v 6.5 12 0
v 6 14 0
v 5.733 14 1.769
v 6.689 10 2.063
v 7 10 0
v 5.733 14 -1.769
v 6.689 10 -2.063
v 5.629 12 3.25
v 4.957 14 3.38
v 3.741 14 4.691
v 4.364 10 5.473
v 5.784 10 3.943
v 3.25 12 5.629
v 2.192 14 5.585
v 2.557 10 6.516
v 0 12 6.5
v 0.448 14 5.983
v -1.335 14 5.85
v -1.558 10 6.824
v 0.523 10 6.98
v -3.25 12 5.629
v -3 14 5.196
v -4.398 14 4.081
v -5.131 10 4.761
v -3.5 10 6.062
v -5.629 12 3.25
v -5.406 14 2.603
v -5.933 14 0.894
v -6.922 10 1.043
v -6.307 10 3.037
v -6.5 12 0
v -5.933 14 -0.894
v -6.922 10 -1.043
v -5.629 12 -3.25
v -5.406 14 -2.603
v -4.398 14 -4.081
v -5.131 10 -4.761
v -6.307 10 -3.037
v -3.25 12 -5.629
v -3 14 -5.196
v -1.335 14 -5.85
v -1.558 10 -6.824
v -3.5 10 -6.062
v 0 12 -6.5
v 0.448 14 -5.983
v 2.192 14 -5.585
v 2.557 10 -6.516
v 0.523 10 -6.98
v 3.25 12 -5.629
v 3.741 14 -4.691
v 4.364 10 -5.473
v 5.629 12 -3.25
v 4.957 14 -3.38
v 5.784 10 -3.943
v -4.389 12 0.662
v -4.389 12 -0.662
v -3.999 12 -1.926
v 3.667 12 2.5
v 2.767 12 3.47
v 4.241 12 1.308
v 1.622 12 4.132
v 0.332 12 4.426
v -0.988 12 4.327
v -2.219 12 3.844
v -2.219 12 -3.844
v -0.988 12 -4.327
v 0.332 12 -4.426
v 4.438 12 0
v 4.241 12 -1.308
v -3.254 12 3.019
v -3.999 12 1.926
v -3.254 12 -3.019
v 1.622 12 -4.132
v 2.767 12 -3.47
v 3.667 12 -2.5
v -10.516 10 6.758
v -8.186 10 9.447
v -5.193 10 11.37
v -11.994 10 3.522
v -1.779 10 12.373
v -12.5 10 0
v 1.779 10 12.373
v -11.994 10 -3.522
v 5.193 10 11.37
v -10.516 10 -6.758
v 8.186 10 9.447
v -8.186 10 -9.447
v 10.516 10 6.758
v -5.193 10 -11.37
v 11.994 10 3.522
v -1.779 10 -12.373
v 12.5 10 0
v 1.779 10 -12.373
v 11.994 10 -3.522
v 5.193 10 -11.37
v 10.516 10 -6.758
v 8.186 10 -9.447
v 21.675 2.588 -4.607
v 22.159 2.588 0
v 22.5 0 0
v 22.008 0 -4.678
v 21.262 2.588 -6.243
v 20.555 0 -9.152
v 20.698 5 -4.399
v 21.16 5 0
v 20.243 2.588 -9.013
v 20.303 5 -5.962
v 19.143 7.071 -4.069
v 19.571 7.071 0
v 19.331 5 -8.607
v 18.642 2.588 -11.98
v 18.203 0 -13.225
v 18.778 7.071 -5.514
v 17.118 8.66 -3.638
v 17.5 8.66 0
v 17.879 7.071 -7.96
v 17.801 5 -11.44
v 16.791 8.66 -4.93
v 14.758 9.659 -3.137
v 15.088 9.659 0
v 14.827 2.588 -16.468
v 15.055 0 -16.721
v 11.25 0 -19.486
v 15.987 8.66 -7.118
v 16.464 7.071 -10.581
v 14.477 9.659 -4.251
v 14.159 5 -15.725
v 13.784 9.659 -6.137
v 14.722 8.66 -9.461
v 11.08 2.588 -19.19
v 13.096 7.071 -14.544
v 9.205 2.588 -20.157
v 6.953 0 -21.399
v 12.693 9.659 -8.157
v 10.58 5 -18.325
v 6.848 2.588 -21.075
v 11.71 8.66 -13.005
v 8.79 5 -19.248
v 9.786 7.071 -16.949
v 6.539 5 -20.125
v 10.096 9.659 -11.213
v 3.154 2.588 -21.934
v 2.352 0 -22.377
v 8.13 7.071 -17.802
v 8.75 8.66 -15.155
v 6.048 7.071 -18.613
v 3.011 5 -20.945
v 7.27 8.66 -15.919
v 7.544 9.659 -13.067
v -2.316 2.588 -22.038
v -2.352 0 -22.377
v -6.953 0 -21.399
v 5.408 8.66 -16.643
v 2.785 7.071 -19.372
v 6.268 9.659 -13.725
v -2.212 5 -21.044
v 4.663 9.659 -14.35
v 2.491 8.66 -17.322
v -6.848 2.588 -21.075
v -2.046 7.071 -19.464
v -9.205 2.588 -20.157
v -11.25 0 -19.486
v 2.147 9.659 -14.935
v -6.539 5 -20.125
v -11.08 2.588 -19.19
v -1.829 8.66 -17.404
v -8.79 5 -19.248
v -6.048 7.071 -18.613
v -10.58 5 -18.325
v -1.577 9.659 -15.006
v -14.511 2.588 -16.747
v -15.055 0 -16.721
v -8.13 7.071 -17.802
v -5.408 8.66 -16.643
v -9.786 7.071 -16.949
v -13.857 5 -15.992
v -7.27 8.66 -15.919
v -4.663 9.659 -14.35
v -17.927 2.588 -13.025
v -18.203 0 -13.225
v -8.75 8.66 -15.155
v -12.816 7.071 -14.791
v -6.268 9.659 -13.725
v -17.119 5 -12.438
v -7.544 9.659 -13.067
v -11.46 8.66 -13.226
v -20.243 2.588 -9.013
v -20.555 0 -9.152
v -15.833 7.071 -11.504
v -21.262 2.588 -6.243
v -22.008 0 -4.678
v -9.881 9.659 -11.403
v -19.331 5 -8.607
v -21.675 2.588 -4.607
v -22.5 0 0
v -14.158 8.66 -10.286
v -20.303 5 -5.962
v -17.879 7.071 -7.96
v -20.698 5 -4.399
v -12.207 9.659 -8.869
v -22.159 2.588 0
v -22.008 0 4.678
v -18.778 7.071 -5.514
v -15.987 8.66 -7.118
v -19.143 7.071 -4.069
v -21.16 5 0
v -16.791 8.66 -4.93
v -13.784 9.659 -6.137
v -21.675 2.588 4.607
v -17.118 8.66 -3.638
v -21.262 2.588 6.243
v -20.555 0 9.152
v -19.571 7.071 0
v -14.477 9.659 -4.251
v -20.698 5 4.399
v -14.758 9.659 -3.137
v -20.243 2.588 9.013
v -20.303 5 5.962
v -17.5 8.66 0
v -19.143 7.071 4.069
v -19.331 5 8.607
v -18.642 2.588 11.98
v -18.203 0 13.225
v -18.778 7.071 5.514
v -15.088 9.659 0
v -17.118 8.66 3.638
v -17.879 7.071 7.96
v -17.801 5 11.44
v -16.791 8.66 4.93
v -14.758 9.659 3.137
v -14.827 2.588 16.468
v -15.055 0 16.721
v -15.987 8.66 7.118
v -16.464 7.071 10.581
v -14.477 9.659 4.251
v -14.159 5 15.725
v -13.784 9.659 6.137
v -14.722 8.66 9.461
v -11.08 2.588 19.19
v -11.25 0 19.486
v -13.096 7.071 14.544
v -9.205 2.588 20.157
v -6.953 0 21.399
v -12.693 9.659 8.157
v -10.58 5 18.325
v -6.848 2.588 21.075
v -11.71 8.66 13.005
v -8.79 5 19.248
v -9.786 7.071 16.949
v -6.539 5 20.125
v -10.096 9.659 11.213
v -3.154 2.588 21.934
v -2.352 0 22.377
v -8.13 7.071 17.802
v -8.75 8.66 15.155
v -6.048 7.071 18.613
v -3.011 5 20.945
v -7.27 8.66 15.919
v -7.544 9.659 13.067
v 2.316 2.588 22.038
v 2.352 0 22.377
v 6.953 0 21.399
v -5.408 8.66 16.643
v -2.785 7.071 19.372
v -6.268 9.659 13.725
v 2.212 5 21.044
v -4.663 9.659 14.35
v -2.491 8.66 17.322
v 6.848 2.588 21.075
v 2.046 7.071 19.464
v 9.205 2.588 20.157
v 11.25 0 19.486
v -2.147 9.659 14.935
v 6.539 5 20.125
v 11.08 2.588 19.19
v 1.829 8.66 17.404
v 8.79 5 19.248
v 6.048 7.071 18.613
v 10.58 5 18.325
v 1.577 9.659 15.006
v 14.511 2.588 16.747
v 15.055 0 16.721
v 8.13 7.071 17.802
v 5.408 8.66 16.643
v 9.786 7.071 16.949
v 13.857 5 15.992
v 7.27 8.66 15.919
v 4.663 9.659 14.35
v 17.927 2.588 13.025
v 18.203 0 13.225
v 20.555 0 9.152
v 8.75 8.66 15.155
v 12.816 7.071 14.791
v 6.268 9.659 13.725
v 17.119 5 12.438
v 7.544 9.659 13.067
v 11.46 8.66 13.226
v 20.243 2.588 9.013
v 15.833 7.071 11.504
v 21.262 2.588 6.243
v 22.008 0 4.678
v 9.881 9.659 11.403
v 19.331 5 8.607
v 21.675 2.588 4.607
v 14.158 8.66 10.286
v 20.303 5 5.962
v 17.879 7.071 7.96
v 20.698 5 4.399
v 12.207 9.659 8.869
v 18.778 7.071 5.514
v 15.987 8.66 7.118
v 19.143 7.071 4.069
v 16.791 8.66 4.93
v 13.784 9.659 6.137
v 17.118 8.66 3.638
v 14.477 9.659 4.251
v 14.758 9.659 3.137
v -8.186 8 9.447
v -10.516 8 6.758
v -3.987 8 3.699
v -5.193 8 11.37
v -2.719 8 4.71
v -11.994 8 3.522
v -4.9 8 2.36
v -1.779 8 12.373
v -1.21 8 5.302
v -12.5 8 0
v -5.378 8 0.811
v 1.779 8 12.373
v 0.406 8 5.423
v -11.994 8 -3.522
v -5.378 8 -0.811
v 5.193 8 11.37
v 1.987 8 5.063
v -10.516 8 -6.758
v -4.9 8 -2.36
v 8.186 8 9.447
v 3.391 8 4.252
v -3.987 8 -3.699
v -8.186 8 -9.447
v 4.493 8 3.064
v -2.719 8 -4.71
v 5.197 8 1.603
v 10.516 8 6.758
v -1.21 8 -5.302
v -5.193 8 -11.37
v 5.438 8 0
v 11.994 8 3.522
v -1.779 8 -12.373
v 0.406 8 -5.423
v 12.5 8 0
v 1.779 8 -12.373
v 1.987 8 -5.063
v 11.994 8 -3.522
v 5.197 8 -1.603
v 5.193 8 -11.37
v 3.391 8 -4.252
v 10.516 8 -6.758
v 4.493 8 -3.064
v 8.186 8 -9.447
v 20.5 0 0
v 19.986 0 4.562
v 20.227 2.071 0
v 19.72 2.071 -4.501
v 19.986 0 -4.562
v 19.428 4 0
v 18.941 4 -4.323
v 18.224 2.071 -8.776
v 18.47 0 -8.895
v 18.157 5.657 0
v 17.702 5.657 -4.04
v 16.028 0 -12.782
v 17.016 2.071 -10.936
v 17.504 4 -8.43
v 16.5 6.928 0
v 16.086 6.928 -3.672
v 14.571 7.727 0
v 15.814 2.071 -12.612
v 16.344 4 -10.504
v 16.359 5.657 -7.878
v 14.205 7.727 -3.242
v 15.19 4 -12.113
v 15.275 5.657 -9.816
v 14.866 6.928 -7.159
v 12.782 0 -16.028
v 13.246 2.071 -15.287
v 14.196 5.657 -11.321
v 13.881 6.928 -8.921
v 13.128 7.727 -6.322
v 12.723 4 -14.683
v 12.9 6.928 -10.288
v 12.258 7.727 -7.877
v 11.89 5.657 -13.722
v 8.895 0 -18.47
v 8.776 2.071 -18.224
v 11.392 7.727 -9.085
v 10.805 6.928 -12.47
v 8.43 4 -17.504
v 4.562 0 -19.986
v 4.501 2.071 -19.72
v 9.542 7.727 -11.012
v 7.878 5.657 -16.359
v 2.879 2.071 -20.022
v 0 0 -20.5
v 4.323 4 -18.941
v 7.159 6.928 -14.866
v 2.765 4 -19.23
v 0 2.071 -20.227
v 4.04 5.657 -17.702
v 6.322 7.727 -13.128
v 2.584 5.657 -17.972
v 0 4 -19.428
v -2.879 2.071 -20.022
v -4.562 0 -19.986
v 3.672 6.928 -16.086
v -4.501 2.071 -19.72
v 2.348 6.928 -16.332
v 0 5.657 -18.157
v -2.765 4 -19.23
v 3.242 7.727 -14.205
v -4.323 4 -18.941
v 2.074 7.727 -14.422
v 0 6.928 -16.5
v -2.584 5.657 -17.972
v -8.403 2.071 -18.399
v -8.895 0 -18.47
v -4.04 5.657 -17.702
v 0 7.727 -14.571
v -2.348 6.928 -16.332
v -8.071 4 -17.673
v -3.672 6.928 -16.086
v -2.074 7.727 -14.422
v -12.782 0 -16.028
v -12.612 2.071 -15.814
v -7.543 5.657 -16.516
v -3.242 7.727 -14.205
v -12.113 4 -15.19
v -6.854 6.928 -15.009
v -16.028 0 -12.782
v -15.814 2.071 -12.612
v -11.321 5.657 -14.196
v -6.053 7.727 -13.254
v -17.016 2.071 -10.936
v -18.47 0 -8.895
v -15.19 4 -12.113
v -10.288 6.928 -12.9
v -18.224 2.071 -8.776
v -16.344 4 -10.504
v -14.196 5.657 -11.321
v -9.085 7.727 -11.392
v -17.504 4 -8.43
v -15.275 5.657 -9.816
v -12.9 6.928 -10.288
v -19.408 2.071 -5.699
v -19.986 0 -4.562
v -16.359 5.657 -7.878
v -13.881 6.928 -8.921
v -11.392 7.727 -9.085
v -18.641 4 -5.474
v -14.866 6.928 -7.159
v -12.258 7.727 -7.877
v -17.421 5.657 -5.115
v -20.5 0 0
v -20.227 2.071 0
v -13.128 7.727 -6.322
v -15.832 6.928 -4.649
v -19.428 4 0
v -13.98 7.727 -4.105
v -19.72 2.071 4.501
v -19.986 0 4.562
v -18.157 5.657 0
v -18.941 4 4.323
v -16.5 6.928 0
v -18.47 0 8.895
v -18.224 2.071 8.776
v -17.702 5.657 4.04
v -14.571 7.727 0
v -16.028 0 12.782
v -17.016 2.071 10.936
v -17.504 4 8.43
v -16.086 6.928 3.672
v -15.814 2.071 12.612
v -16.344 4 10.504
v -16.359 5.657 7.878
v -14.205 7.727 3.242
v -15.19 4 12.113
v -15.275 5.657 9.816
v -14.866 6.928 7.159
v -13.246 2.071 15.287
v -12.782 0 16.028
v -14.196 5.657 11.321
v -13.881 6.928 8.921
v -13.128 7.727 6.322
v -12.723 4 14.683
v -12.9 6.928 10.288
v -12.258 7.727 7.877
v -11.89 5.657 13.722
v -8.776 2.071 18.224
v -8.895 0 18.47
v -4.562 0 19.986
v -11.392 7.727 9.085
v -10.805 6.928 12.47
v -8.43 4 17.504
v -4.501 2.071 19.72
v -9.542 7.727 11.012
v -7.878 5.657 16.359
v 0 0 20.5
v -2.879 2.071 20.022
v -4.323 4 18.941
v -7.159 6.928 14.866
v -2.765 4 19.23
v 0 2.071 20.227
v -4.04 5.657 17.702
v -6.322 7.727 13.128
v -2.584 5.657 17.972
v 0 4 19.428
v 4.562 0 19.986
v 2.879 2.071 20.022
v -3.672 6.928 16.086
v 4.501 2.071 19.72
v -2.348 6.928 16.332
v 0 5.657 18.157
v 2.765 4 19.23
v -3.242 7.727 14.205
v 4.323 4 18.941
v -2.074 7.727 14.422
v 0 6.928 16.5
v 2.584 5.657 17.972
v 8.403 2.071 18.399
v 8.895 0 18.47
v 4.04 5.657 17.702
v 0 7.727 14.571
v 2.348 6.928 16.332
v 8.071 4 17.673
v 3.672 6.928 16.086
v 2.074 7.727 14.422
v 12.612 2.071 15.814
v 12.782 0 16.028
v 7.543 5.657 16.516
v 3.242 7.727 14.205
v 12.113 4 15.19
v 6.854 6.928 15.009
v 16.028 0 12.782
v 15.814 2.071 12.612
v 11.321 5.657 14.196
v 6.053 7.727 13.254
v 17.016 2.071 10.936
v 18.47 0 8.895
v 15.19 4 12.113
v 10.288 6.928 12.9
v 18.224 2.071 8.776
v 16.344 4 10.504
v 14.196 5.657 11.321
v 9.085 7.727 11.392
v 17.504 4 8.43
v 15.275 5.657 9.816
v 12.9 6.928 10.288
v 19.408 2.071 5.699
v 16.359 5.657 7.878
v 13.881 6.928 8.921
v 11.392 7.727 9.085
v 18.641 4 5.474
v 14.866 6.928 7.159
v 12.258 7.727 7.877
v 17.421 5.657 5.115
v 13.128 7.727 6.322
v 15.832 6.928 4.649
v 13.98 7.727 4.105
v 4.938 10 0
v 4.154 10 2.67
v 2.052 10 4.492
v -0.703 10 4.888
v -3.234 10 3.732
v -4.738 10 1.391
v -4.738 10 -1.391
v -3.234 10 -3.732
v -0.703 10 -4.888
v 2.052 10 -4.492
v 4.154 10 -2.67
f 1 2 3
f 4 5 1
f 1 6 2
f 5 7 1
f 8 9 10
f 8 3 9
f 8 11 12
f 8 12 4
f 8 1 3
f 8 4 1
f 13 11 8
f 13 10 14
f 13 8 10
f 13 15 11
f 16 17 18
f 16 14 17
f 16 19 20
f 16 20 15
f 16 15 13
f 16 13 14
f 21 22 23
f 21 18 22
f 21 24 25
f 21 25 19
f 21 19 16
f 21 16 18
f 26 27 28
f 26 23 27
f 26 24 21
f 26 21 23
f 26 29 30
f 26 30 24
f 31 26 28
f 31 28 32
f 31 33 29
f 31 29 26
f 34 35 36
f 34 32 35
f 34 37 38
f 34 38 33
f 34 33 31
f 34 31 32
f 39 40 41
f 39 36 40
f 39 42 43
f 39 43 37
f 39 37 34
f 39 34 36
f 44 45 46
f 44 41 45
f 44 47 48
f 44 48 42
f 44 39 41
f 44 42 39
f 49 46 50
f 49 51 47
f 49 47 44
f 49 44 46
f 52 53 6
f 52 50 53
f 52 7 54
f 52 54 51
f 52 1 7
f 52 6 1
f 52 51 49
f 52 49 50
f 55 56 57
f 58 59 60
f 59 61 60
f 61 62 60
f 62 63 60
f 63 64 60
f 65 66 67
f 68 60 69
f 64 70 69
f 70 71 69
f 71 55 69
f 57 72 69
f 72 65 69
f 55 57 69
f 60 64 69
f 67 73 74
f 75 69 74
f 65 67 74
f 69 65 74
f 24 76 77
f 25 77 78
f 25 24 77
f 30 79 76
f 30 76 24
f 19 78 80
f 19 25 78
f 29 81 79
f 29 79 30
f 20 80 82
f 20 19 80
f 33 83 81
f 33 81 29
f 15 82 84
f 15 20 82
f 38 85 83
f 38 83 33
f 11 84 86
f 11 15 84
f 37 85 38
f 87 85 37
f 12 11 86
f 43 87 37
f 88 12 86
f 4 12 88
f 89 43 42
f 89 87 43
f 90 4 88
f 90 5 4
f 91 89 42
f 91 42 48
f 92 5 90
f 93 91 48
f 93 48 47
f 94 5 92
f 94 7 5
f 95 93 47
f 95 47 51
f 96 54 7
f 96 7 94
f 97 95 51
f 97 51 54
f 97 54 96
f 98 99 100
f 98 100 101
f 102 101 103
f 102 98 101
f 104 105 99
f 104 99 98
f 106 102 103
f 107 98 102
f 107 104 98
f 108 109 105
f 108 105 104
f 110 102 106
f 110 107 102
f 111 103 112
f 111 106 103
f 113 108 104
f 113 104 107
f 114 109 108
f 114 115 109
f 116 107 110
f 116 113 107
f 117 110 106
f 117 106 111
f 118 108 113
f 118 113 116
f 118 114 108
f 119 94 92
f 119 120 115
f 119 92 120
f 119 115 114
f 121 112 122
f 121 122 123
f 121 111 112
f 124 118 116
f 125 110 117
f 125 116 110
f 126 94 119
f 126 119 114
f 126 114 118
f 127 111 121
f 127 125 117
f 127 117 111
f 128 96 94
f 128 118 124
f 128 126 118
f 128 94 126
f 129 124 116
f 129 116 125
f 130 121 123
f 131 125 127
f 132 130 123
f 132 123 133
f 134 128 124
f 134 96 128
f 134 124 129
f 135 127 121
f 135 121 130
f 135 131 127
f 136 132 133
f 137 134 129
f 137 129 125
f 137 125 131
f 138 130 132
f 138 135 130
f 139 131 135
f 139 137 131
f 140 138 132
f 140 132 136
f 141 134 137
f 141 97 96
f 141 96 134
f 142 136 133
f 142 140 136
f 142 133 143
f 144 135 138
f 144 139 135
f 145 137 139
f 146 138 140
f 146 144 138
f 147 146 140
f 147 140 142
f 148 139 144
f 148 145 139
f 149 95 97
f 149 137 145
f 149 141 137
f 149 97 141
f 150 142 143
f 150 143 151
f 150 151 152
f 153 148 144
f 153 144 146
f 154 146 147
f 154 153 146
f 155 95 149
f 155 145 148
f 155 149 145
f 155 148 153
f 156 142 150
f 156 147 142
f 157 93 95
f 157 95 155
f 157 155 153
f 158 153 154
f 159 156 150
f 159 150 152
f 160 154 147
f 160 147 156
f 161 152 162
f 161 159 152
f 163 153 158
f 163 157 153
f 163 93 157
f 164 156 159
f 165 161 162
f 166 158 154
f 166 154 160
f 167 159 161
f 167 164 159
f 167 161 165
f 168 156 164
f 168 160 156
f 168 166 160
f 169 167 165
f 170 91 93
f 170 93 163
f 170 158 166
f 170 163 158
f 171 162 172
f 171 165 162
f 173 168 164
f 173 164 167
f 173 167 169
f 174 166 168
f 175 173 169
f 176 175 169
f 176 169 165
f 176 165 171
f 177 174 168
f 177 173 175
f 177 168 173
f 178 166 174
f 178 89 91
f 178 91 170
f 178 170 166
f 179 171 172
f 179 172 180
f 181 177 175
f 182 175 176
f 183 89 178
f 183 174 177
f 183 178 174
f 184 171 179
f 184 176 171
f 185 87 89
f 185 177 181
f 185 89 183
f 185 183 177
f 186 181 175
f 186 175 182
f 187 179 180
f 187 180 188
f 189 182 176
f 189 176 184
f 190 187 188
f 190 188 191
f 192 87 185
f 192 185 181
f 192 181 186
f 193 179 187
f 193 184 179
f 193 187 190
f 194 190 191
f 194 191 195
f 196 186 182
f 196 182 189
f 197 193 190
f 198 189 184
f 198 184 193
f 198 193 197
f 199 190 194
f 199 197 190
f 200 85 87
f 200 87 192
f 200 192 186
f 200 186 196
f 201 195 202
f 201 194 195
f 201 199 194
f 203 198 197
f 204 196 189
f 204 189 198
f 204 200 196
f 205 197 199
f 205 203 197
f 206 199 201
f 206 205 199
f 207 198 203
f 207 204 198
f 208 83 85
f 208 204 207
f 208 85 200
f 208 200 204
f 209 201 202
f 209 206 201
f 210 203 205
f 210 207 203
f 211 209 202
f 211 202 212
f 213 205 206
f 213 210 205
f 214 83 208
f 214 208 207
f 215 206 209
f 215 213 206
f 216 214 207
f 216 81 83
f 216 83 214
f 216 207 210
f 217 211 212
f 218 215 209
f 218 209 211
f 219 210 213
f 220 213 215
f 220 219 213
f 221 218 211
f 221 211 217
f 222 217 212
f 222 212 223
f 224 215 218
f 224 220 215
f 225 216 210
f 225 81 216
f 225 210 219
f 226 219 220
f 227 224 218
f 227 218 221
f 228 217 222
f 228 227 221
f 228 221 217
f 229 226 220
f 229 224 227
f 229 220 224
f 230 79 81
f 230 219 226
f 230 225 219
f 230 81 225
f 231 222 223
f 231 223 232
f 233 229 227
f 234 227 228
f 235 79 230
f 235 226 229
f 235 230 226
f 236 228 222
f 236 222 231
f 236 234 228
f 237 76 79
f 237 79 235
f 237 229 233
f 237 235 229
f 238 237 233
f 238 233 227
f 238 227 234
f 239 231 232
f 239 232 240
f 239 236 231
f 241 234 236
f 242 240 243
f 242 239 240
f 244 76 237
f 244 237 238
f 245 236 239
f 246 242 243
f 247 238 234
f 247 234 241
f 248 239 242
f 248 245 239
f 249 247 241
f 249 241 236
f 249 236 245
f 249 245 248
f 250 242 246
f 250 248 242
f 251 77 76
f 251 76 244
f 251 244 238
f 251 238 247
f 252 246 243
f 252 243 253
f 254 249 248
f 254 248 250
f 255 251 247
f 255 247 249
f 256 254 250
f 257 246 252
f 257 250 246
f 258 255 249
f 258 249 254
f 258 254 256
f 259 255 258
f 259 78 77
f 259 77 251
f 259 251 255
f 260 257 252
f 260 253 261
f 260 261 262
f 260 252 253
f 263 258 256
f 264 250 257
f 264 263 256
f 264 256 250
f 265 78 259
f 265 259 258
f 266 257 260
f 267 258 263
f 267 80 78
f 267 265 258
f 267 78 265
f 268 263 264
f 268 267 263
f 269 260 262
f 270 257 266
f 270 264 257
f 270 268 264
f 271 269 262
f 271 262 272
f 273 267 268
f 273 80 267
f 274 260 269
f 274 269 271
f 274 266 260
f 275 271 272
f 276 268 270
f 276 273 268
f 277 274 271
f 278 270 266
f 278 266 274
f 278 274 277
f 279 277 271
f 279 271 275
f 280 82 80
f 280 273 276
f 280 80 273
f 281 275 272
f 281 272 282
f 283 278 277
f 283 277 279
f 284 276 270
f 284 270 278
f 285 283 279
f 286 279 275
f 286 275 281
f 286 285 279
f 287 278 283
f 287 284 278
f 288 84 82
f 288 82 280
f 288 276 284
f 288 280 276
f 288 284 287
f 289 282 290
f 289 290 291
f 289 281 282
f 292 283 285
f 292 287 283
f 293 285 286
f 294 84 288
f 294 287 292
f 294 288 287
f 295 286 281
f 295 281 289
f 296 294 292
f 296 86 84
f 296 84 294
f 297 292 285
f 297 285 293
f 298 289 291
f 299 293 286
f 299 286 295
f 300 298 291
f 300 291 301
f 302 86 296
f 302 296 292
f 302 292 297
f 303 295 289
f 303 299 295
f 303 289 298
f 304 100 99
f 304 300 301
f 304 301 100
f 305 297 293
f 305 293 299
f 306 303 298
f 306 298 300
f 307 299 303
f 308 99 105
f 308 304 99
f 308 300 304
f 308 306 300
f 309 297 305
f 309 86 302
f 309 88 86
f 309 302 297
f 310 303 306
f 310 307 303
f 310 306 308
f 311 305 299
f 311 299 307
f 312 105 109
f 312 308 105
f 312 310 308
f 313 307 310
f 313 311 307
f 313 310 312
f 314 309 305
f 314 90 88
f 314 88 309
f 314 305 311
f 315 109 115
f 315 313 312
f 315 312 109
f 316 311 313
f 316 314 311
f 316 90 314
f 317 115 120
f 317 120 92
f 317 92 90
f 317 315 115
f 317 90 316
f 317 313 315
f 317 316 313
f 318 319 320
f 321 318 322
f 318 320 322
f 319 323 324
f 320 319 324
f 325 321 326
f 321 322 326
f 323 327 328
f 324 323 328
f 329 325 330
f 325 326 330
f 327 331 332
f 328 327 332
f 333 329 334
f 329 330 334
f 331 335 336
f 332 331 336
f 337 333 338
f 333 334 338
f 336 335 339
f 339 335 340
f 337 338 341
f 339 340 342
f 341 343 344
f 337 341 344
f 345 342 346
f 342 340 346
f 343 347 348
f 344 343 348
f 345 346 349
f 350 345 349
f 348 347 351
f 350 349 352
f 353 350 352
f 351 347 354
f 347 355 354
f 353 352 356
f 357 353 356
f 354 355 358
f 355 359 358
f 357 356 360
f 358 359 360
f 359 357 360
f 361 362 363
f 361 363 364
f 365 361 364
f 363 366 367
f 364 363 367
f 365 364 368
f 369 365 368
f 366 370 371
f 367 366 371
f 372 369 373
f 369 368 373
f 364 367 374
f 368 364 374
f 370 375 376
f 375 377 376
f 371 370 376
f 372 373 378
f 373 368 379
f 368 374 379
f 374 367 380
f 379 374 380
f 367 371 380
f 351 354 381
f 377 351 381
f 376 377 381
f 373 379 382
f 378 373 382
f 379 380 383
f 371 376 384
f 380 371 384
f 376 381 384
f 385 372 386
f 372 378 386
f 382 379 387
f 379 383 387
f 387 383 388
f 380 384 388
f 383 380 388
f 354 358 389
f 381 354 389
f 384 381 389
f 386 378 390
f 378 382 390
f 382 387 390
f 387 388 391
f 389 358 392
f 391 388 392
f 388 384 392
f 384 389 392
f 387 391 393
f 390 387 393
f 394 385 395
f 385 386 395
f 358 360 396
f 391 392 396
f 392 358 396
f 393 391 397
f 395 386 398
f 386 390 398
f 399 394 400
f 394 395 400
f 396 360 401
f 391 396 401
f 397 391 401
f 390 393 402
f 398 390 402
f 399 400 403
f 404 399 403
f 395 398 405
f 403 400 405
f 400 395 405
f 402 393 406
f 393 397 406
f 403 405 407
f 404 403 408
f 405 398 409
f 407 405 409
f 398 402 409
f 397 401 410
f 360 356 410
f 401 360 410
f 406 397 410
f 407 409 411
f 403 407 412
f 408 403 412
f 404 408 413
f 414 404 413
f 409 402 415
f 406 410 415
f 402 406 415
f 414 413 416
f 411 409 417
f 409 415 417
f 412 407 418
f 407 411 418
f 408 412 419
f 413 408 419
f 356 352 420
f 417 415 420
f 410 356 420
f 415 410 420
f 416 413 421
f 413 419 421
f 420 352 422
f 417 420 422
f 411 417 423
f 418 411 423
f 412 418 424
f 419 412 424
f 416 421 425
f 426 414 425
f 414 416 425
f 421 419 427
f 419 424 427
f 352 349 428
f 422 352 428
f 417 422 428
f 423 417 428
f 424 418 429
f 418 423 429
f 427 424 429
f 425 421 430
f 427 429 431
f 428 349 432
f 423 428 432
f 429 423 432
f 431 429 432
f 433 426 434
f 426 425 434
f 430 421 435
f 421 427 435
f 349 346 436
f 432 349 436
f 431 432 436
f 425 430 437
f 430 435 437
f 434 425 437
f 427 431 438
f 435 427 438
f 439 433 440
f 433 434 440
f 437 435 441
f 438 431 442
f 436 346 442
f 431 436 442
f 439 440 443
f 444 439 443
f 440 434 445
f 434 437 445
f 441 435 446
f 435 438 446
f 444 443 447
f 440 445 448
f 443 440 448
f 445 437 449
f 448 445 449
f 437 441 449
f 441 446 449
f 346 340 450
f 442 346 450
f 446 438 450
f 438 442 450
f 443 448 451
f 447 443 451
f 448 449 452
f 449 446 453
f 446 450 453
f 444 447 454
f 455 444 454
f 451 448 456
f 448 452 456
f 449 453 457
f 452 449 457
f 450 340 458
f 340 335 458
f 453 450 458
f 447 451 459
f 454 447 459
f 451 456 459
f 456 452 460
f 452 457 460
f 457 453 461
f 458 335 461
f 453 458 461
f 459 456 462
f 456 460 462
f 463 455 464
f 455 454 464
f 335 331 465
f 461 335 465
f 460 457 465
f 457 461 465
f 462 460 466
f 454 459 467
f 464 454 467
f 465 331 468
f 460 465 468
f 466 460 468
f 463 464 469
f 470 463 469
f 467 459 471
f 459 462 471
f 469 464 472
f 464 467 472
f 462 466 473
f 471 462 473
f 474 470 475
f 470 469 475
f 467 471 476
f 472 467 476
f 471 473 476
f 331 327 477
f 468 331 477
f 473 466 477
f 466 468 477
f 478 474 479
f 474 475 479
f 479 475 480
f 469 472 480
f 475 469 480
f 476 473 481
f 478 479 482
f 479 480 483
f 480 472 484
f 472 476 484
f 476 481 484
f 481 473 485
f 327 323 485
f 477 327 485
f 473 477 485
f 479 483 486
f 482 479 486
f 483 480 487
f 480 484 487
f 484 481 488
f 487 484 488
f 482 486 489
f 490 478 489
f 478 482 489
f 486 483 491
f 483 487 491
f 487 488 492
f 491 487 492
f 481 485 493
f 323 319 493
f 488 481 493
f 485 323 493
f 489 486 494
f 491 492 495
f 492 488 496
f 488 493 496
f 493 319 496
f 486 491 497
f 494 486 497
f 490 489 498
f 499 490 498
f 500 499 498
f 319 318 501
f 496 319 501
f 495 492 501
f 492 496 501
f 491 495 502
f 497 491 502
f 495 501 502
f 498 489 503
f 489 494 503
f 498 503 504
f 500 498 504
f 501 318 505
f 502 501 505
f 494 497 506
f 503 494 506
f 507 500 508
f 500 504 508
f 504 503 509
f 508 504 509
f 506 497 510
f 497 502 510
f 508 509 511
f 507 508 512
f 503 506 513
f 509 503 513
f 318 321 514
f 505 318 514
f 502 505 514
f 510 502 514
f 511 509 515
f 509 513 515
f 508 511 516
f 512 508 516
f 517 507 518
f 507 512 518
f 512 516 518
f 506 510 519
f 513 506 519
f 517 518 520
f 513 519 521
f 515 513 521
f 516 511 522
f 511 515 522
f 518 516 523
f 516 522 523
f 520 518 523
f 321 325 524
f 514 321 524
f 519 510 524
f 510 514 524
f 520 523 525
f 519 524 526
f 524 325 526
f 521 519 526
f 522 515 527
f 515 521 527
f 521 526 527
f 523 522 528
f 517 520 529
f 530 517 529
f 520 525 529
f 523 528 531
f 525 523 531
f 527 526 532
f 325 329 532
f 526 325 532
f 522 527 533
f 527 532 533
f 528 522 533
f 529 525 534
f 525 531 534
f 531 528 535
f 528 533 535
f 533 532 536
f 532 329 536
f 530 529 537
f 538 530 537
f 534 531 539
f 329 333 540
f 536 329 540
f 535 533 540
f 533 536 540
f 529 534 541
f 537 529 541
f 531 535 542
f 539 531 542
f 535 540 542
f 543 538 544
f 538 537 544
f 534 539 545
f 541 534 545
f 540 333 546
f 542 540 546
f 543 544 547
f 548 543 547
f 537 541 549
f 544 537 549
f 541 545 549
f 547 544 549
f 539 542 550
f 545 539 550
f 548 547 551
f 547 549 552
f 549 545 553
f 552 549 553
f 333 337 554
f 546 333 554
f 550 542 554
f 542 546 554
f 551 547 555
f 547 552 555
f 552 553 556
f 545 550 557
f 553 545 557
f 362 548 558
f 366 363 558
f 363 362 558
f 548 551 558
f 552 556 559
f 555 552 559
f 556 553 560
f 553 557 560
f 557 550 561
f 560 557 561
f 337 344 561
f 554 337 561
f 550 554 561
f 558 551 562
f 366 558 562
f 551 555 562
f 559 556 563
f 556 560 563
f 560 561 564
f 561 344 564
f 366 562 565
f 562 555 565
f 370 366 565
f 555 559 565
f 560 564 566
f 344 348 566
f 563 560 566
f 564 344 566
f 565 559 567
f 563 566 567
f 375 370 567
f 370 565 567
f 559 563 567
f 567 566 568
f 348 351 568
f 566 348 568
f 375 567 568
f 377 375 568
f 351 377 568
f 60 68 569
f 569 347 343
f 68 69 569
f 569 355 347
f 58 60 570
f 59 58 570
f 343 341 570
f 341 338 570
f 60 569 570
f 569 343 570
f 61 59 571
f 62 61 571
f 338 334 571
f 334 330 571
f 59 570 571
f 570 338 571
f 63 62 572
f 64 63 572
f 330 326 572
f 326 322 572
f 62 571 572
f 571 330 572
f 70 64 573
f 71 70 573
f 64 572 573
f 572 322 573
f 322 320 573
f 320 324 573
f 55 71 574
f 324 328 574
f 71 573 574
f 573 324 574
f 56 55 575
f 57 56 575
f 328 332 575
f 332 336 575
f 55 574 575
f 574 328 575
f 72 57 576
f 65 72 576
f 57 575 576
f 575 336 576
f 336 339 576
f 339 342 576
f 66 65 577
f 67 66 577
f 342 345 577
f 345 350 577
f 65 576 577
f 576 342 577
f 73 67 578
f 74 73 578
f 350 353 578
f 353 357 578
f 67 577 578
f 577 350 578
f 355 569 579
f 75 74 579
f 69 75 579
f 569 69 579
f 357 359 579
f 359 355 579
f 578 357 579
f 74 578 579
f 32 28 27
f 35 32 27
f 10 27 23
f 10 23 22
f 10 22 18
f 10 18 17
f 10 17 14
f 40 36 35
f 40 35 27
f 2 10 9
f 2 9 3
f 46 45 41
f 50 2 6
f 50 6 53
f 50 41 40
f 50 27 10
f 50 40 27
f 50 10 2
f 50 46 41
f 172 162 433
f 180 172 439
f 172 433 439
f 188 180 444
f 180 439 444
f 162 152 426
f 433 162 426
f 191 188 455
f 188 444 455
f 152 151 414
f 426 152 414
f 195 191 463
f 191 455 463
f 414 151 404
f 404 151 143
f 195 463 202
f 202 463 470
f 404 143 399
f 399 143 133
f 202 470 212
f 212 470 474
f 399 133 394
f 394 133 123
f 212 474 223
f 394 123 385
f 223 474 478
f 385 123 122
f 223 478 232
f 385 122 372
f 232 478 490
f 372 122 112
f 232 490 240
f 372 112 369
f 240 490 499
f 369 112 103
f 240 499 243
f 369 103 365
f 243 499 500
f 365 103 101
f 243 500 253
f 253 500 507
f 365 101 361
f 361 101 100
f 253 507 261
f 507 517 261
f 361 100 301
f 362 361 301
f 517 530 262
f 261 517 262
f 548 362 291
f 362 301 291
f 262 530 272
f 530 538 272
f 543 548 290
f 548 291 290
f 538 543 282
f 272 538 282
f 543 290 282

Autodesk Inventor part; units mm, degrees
ref_plane "YZ Plane" through (0, 0, 0) normal (1, 0, 0) x (0, 1, 0)
ref_plane "XZ Plane" through (0, 0, 0) normal (0, 1, 0) x (-1, 0, 0)
ref_plane "XY Plane" through (0, 0, 0) normal (0, 0, 1) x (1, 0, 0)
sketch "Sketch1" plane through (0, 0, 0) normal (0, 0, 1) x (1, 0, 0)
  line L0 (0, 0) -> (22.5, 0) construction
  line L1 (0, 0) -> (0, 10) construction
  line L2 (0, 10) -> (7, 10) construction
  line L3 (7, 10) -> (0, 10) construction
  line L4 (0, 10) -> (0, 14) construction
  line L5 (0, 14) -> (6, 14) construction
  line L6 (0, 10) -> (12.5, 10) construction
  line L7 (6, 14) -> (7, 10)
  line L8 (7, 10) -> (12.5, 10)
  line L9 (12.5, 10) -> (12.5, 10)
  line L10 (22.5, 0) -> (22.5, 0)
  arc A0 (22.5, 0) -> (12.5, 10) centre (12.5, 0) ccw
  line L11 (6, 14) -> (0, 14)
  point P0 (22.5, 10)
  dimension "d0" = 22.5
  dimension "d1" = 10
  dimension "d2" = 7
  dimension "d3" = 4
  dimension "d4" = 6
  dimension "d5" = 12.5
  dimension "d6" = 10
surface revolve "RevolutionSrf1" sketch "Sketch1" angle 360 about axis through (0, 0, 0) along (0, 1, 0) shown no curves L10 A0 L9 L8 L7 L11
thicken "Thicken1" operation new thickness 2 both sides no extend neighbours no toward (0, -1, 0) faces at (-0.7092, 14, -1.4219) (6.4729, 11.3333, 1.5954) (10.5456, 10, 0.9971) (22.181, 0.7473, 3.6048)
properties part number "cup"
